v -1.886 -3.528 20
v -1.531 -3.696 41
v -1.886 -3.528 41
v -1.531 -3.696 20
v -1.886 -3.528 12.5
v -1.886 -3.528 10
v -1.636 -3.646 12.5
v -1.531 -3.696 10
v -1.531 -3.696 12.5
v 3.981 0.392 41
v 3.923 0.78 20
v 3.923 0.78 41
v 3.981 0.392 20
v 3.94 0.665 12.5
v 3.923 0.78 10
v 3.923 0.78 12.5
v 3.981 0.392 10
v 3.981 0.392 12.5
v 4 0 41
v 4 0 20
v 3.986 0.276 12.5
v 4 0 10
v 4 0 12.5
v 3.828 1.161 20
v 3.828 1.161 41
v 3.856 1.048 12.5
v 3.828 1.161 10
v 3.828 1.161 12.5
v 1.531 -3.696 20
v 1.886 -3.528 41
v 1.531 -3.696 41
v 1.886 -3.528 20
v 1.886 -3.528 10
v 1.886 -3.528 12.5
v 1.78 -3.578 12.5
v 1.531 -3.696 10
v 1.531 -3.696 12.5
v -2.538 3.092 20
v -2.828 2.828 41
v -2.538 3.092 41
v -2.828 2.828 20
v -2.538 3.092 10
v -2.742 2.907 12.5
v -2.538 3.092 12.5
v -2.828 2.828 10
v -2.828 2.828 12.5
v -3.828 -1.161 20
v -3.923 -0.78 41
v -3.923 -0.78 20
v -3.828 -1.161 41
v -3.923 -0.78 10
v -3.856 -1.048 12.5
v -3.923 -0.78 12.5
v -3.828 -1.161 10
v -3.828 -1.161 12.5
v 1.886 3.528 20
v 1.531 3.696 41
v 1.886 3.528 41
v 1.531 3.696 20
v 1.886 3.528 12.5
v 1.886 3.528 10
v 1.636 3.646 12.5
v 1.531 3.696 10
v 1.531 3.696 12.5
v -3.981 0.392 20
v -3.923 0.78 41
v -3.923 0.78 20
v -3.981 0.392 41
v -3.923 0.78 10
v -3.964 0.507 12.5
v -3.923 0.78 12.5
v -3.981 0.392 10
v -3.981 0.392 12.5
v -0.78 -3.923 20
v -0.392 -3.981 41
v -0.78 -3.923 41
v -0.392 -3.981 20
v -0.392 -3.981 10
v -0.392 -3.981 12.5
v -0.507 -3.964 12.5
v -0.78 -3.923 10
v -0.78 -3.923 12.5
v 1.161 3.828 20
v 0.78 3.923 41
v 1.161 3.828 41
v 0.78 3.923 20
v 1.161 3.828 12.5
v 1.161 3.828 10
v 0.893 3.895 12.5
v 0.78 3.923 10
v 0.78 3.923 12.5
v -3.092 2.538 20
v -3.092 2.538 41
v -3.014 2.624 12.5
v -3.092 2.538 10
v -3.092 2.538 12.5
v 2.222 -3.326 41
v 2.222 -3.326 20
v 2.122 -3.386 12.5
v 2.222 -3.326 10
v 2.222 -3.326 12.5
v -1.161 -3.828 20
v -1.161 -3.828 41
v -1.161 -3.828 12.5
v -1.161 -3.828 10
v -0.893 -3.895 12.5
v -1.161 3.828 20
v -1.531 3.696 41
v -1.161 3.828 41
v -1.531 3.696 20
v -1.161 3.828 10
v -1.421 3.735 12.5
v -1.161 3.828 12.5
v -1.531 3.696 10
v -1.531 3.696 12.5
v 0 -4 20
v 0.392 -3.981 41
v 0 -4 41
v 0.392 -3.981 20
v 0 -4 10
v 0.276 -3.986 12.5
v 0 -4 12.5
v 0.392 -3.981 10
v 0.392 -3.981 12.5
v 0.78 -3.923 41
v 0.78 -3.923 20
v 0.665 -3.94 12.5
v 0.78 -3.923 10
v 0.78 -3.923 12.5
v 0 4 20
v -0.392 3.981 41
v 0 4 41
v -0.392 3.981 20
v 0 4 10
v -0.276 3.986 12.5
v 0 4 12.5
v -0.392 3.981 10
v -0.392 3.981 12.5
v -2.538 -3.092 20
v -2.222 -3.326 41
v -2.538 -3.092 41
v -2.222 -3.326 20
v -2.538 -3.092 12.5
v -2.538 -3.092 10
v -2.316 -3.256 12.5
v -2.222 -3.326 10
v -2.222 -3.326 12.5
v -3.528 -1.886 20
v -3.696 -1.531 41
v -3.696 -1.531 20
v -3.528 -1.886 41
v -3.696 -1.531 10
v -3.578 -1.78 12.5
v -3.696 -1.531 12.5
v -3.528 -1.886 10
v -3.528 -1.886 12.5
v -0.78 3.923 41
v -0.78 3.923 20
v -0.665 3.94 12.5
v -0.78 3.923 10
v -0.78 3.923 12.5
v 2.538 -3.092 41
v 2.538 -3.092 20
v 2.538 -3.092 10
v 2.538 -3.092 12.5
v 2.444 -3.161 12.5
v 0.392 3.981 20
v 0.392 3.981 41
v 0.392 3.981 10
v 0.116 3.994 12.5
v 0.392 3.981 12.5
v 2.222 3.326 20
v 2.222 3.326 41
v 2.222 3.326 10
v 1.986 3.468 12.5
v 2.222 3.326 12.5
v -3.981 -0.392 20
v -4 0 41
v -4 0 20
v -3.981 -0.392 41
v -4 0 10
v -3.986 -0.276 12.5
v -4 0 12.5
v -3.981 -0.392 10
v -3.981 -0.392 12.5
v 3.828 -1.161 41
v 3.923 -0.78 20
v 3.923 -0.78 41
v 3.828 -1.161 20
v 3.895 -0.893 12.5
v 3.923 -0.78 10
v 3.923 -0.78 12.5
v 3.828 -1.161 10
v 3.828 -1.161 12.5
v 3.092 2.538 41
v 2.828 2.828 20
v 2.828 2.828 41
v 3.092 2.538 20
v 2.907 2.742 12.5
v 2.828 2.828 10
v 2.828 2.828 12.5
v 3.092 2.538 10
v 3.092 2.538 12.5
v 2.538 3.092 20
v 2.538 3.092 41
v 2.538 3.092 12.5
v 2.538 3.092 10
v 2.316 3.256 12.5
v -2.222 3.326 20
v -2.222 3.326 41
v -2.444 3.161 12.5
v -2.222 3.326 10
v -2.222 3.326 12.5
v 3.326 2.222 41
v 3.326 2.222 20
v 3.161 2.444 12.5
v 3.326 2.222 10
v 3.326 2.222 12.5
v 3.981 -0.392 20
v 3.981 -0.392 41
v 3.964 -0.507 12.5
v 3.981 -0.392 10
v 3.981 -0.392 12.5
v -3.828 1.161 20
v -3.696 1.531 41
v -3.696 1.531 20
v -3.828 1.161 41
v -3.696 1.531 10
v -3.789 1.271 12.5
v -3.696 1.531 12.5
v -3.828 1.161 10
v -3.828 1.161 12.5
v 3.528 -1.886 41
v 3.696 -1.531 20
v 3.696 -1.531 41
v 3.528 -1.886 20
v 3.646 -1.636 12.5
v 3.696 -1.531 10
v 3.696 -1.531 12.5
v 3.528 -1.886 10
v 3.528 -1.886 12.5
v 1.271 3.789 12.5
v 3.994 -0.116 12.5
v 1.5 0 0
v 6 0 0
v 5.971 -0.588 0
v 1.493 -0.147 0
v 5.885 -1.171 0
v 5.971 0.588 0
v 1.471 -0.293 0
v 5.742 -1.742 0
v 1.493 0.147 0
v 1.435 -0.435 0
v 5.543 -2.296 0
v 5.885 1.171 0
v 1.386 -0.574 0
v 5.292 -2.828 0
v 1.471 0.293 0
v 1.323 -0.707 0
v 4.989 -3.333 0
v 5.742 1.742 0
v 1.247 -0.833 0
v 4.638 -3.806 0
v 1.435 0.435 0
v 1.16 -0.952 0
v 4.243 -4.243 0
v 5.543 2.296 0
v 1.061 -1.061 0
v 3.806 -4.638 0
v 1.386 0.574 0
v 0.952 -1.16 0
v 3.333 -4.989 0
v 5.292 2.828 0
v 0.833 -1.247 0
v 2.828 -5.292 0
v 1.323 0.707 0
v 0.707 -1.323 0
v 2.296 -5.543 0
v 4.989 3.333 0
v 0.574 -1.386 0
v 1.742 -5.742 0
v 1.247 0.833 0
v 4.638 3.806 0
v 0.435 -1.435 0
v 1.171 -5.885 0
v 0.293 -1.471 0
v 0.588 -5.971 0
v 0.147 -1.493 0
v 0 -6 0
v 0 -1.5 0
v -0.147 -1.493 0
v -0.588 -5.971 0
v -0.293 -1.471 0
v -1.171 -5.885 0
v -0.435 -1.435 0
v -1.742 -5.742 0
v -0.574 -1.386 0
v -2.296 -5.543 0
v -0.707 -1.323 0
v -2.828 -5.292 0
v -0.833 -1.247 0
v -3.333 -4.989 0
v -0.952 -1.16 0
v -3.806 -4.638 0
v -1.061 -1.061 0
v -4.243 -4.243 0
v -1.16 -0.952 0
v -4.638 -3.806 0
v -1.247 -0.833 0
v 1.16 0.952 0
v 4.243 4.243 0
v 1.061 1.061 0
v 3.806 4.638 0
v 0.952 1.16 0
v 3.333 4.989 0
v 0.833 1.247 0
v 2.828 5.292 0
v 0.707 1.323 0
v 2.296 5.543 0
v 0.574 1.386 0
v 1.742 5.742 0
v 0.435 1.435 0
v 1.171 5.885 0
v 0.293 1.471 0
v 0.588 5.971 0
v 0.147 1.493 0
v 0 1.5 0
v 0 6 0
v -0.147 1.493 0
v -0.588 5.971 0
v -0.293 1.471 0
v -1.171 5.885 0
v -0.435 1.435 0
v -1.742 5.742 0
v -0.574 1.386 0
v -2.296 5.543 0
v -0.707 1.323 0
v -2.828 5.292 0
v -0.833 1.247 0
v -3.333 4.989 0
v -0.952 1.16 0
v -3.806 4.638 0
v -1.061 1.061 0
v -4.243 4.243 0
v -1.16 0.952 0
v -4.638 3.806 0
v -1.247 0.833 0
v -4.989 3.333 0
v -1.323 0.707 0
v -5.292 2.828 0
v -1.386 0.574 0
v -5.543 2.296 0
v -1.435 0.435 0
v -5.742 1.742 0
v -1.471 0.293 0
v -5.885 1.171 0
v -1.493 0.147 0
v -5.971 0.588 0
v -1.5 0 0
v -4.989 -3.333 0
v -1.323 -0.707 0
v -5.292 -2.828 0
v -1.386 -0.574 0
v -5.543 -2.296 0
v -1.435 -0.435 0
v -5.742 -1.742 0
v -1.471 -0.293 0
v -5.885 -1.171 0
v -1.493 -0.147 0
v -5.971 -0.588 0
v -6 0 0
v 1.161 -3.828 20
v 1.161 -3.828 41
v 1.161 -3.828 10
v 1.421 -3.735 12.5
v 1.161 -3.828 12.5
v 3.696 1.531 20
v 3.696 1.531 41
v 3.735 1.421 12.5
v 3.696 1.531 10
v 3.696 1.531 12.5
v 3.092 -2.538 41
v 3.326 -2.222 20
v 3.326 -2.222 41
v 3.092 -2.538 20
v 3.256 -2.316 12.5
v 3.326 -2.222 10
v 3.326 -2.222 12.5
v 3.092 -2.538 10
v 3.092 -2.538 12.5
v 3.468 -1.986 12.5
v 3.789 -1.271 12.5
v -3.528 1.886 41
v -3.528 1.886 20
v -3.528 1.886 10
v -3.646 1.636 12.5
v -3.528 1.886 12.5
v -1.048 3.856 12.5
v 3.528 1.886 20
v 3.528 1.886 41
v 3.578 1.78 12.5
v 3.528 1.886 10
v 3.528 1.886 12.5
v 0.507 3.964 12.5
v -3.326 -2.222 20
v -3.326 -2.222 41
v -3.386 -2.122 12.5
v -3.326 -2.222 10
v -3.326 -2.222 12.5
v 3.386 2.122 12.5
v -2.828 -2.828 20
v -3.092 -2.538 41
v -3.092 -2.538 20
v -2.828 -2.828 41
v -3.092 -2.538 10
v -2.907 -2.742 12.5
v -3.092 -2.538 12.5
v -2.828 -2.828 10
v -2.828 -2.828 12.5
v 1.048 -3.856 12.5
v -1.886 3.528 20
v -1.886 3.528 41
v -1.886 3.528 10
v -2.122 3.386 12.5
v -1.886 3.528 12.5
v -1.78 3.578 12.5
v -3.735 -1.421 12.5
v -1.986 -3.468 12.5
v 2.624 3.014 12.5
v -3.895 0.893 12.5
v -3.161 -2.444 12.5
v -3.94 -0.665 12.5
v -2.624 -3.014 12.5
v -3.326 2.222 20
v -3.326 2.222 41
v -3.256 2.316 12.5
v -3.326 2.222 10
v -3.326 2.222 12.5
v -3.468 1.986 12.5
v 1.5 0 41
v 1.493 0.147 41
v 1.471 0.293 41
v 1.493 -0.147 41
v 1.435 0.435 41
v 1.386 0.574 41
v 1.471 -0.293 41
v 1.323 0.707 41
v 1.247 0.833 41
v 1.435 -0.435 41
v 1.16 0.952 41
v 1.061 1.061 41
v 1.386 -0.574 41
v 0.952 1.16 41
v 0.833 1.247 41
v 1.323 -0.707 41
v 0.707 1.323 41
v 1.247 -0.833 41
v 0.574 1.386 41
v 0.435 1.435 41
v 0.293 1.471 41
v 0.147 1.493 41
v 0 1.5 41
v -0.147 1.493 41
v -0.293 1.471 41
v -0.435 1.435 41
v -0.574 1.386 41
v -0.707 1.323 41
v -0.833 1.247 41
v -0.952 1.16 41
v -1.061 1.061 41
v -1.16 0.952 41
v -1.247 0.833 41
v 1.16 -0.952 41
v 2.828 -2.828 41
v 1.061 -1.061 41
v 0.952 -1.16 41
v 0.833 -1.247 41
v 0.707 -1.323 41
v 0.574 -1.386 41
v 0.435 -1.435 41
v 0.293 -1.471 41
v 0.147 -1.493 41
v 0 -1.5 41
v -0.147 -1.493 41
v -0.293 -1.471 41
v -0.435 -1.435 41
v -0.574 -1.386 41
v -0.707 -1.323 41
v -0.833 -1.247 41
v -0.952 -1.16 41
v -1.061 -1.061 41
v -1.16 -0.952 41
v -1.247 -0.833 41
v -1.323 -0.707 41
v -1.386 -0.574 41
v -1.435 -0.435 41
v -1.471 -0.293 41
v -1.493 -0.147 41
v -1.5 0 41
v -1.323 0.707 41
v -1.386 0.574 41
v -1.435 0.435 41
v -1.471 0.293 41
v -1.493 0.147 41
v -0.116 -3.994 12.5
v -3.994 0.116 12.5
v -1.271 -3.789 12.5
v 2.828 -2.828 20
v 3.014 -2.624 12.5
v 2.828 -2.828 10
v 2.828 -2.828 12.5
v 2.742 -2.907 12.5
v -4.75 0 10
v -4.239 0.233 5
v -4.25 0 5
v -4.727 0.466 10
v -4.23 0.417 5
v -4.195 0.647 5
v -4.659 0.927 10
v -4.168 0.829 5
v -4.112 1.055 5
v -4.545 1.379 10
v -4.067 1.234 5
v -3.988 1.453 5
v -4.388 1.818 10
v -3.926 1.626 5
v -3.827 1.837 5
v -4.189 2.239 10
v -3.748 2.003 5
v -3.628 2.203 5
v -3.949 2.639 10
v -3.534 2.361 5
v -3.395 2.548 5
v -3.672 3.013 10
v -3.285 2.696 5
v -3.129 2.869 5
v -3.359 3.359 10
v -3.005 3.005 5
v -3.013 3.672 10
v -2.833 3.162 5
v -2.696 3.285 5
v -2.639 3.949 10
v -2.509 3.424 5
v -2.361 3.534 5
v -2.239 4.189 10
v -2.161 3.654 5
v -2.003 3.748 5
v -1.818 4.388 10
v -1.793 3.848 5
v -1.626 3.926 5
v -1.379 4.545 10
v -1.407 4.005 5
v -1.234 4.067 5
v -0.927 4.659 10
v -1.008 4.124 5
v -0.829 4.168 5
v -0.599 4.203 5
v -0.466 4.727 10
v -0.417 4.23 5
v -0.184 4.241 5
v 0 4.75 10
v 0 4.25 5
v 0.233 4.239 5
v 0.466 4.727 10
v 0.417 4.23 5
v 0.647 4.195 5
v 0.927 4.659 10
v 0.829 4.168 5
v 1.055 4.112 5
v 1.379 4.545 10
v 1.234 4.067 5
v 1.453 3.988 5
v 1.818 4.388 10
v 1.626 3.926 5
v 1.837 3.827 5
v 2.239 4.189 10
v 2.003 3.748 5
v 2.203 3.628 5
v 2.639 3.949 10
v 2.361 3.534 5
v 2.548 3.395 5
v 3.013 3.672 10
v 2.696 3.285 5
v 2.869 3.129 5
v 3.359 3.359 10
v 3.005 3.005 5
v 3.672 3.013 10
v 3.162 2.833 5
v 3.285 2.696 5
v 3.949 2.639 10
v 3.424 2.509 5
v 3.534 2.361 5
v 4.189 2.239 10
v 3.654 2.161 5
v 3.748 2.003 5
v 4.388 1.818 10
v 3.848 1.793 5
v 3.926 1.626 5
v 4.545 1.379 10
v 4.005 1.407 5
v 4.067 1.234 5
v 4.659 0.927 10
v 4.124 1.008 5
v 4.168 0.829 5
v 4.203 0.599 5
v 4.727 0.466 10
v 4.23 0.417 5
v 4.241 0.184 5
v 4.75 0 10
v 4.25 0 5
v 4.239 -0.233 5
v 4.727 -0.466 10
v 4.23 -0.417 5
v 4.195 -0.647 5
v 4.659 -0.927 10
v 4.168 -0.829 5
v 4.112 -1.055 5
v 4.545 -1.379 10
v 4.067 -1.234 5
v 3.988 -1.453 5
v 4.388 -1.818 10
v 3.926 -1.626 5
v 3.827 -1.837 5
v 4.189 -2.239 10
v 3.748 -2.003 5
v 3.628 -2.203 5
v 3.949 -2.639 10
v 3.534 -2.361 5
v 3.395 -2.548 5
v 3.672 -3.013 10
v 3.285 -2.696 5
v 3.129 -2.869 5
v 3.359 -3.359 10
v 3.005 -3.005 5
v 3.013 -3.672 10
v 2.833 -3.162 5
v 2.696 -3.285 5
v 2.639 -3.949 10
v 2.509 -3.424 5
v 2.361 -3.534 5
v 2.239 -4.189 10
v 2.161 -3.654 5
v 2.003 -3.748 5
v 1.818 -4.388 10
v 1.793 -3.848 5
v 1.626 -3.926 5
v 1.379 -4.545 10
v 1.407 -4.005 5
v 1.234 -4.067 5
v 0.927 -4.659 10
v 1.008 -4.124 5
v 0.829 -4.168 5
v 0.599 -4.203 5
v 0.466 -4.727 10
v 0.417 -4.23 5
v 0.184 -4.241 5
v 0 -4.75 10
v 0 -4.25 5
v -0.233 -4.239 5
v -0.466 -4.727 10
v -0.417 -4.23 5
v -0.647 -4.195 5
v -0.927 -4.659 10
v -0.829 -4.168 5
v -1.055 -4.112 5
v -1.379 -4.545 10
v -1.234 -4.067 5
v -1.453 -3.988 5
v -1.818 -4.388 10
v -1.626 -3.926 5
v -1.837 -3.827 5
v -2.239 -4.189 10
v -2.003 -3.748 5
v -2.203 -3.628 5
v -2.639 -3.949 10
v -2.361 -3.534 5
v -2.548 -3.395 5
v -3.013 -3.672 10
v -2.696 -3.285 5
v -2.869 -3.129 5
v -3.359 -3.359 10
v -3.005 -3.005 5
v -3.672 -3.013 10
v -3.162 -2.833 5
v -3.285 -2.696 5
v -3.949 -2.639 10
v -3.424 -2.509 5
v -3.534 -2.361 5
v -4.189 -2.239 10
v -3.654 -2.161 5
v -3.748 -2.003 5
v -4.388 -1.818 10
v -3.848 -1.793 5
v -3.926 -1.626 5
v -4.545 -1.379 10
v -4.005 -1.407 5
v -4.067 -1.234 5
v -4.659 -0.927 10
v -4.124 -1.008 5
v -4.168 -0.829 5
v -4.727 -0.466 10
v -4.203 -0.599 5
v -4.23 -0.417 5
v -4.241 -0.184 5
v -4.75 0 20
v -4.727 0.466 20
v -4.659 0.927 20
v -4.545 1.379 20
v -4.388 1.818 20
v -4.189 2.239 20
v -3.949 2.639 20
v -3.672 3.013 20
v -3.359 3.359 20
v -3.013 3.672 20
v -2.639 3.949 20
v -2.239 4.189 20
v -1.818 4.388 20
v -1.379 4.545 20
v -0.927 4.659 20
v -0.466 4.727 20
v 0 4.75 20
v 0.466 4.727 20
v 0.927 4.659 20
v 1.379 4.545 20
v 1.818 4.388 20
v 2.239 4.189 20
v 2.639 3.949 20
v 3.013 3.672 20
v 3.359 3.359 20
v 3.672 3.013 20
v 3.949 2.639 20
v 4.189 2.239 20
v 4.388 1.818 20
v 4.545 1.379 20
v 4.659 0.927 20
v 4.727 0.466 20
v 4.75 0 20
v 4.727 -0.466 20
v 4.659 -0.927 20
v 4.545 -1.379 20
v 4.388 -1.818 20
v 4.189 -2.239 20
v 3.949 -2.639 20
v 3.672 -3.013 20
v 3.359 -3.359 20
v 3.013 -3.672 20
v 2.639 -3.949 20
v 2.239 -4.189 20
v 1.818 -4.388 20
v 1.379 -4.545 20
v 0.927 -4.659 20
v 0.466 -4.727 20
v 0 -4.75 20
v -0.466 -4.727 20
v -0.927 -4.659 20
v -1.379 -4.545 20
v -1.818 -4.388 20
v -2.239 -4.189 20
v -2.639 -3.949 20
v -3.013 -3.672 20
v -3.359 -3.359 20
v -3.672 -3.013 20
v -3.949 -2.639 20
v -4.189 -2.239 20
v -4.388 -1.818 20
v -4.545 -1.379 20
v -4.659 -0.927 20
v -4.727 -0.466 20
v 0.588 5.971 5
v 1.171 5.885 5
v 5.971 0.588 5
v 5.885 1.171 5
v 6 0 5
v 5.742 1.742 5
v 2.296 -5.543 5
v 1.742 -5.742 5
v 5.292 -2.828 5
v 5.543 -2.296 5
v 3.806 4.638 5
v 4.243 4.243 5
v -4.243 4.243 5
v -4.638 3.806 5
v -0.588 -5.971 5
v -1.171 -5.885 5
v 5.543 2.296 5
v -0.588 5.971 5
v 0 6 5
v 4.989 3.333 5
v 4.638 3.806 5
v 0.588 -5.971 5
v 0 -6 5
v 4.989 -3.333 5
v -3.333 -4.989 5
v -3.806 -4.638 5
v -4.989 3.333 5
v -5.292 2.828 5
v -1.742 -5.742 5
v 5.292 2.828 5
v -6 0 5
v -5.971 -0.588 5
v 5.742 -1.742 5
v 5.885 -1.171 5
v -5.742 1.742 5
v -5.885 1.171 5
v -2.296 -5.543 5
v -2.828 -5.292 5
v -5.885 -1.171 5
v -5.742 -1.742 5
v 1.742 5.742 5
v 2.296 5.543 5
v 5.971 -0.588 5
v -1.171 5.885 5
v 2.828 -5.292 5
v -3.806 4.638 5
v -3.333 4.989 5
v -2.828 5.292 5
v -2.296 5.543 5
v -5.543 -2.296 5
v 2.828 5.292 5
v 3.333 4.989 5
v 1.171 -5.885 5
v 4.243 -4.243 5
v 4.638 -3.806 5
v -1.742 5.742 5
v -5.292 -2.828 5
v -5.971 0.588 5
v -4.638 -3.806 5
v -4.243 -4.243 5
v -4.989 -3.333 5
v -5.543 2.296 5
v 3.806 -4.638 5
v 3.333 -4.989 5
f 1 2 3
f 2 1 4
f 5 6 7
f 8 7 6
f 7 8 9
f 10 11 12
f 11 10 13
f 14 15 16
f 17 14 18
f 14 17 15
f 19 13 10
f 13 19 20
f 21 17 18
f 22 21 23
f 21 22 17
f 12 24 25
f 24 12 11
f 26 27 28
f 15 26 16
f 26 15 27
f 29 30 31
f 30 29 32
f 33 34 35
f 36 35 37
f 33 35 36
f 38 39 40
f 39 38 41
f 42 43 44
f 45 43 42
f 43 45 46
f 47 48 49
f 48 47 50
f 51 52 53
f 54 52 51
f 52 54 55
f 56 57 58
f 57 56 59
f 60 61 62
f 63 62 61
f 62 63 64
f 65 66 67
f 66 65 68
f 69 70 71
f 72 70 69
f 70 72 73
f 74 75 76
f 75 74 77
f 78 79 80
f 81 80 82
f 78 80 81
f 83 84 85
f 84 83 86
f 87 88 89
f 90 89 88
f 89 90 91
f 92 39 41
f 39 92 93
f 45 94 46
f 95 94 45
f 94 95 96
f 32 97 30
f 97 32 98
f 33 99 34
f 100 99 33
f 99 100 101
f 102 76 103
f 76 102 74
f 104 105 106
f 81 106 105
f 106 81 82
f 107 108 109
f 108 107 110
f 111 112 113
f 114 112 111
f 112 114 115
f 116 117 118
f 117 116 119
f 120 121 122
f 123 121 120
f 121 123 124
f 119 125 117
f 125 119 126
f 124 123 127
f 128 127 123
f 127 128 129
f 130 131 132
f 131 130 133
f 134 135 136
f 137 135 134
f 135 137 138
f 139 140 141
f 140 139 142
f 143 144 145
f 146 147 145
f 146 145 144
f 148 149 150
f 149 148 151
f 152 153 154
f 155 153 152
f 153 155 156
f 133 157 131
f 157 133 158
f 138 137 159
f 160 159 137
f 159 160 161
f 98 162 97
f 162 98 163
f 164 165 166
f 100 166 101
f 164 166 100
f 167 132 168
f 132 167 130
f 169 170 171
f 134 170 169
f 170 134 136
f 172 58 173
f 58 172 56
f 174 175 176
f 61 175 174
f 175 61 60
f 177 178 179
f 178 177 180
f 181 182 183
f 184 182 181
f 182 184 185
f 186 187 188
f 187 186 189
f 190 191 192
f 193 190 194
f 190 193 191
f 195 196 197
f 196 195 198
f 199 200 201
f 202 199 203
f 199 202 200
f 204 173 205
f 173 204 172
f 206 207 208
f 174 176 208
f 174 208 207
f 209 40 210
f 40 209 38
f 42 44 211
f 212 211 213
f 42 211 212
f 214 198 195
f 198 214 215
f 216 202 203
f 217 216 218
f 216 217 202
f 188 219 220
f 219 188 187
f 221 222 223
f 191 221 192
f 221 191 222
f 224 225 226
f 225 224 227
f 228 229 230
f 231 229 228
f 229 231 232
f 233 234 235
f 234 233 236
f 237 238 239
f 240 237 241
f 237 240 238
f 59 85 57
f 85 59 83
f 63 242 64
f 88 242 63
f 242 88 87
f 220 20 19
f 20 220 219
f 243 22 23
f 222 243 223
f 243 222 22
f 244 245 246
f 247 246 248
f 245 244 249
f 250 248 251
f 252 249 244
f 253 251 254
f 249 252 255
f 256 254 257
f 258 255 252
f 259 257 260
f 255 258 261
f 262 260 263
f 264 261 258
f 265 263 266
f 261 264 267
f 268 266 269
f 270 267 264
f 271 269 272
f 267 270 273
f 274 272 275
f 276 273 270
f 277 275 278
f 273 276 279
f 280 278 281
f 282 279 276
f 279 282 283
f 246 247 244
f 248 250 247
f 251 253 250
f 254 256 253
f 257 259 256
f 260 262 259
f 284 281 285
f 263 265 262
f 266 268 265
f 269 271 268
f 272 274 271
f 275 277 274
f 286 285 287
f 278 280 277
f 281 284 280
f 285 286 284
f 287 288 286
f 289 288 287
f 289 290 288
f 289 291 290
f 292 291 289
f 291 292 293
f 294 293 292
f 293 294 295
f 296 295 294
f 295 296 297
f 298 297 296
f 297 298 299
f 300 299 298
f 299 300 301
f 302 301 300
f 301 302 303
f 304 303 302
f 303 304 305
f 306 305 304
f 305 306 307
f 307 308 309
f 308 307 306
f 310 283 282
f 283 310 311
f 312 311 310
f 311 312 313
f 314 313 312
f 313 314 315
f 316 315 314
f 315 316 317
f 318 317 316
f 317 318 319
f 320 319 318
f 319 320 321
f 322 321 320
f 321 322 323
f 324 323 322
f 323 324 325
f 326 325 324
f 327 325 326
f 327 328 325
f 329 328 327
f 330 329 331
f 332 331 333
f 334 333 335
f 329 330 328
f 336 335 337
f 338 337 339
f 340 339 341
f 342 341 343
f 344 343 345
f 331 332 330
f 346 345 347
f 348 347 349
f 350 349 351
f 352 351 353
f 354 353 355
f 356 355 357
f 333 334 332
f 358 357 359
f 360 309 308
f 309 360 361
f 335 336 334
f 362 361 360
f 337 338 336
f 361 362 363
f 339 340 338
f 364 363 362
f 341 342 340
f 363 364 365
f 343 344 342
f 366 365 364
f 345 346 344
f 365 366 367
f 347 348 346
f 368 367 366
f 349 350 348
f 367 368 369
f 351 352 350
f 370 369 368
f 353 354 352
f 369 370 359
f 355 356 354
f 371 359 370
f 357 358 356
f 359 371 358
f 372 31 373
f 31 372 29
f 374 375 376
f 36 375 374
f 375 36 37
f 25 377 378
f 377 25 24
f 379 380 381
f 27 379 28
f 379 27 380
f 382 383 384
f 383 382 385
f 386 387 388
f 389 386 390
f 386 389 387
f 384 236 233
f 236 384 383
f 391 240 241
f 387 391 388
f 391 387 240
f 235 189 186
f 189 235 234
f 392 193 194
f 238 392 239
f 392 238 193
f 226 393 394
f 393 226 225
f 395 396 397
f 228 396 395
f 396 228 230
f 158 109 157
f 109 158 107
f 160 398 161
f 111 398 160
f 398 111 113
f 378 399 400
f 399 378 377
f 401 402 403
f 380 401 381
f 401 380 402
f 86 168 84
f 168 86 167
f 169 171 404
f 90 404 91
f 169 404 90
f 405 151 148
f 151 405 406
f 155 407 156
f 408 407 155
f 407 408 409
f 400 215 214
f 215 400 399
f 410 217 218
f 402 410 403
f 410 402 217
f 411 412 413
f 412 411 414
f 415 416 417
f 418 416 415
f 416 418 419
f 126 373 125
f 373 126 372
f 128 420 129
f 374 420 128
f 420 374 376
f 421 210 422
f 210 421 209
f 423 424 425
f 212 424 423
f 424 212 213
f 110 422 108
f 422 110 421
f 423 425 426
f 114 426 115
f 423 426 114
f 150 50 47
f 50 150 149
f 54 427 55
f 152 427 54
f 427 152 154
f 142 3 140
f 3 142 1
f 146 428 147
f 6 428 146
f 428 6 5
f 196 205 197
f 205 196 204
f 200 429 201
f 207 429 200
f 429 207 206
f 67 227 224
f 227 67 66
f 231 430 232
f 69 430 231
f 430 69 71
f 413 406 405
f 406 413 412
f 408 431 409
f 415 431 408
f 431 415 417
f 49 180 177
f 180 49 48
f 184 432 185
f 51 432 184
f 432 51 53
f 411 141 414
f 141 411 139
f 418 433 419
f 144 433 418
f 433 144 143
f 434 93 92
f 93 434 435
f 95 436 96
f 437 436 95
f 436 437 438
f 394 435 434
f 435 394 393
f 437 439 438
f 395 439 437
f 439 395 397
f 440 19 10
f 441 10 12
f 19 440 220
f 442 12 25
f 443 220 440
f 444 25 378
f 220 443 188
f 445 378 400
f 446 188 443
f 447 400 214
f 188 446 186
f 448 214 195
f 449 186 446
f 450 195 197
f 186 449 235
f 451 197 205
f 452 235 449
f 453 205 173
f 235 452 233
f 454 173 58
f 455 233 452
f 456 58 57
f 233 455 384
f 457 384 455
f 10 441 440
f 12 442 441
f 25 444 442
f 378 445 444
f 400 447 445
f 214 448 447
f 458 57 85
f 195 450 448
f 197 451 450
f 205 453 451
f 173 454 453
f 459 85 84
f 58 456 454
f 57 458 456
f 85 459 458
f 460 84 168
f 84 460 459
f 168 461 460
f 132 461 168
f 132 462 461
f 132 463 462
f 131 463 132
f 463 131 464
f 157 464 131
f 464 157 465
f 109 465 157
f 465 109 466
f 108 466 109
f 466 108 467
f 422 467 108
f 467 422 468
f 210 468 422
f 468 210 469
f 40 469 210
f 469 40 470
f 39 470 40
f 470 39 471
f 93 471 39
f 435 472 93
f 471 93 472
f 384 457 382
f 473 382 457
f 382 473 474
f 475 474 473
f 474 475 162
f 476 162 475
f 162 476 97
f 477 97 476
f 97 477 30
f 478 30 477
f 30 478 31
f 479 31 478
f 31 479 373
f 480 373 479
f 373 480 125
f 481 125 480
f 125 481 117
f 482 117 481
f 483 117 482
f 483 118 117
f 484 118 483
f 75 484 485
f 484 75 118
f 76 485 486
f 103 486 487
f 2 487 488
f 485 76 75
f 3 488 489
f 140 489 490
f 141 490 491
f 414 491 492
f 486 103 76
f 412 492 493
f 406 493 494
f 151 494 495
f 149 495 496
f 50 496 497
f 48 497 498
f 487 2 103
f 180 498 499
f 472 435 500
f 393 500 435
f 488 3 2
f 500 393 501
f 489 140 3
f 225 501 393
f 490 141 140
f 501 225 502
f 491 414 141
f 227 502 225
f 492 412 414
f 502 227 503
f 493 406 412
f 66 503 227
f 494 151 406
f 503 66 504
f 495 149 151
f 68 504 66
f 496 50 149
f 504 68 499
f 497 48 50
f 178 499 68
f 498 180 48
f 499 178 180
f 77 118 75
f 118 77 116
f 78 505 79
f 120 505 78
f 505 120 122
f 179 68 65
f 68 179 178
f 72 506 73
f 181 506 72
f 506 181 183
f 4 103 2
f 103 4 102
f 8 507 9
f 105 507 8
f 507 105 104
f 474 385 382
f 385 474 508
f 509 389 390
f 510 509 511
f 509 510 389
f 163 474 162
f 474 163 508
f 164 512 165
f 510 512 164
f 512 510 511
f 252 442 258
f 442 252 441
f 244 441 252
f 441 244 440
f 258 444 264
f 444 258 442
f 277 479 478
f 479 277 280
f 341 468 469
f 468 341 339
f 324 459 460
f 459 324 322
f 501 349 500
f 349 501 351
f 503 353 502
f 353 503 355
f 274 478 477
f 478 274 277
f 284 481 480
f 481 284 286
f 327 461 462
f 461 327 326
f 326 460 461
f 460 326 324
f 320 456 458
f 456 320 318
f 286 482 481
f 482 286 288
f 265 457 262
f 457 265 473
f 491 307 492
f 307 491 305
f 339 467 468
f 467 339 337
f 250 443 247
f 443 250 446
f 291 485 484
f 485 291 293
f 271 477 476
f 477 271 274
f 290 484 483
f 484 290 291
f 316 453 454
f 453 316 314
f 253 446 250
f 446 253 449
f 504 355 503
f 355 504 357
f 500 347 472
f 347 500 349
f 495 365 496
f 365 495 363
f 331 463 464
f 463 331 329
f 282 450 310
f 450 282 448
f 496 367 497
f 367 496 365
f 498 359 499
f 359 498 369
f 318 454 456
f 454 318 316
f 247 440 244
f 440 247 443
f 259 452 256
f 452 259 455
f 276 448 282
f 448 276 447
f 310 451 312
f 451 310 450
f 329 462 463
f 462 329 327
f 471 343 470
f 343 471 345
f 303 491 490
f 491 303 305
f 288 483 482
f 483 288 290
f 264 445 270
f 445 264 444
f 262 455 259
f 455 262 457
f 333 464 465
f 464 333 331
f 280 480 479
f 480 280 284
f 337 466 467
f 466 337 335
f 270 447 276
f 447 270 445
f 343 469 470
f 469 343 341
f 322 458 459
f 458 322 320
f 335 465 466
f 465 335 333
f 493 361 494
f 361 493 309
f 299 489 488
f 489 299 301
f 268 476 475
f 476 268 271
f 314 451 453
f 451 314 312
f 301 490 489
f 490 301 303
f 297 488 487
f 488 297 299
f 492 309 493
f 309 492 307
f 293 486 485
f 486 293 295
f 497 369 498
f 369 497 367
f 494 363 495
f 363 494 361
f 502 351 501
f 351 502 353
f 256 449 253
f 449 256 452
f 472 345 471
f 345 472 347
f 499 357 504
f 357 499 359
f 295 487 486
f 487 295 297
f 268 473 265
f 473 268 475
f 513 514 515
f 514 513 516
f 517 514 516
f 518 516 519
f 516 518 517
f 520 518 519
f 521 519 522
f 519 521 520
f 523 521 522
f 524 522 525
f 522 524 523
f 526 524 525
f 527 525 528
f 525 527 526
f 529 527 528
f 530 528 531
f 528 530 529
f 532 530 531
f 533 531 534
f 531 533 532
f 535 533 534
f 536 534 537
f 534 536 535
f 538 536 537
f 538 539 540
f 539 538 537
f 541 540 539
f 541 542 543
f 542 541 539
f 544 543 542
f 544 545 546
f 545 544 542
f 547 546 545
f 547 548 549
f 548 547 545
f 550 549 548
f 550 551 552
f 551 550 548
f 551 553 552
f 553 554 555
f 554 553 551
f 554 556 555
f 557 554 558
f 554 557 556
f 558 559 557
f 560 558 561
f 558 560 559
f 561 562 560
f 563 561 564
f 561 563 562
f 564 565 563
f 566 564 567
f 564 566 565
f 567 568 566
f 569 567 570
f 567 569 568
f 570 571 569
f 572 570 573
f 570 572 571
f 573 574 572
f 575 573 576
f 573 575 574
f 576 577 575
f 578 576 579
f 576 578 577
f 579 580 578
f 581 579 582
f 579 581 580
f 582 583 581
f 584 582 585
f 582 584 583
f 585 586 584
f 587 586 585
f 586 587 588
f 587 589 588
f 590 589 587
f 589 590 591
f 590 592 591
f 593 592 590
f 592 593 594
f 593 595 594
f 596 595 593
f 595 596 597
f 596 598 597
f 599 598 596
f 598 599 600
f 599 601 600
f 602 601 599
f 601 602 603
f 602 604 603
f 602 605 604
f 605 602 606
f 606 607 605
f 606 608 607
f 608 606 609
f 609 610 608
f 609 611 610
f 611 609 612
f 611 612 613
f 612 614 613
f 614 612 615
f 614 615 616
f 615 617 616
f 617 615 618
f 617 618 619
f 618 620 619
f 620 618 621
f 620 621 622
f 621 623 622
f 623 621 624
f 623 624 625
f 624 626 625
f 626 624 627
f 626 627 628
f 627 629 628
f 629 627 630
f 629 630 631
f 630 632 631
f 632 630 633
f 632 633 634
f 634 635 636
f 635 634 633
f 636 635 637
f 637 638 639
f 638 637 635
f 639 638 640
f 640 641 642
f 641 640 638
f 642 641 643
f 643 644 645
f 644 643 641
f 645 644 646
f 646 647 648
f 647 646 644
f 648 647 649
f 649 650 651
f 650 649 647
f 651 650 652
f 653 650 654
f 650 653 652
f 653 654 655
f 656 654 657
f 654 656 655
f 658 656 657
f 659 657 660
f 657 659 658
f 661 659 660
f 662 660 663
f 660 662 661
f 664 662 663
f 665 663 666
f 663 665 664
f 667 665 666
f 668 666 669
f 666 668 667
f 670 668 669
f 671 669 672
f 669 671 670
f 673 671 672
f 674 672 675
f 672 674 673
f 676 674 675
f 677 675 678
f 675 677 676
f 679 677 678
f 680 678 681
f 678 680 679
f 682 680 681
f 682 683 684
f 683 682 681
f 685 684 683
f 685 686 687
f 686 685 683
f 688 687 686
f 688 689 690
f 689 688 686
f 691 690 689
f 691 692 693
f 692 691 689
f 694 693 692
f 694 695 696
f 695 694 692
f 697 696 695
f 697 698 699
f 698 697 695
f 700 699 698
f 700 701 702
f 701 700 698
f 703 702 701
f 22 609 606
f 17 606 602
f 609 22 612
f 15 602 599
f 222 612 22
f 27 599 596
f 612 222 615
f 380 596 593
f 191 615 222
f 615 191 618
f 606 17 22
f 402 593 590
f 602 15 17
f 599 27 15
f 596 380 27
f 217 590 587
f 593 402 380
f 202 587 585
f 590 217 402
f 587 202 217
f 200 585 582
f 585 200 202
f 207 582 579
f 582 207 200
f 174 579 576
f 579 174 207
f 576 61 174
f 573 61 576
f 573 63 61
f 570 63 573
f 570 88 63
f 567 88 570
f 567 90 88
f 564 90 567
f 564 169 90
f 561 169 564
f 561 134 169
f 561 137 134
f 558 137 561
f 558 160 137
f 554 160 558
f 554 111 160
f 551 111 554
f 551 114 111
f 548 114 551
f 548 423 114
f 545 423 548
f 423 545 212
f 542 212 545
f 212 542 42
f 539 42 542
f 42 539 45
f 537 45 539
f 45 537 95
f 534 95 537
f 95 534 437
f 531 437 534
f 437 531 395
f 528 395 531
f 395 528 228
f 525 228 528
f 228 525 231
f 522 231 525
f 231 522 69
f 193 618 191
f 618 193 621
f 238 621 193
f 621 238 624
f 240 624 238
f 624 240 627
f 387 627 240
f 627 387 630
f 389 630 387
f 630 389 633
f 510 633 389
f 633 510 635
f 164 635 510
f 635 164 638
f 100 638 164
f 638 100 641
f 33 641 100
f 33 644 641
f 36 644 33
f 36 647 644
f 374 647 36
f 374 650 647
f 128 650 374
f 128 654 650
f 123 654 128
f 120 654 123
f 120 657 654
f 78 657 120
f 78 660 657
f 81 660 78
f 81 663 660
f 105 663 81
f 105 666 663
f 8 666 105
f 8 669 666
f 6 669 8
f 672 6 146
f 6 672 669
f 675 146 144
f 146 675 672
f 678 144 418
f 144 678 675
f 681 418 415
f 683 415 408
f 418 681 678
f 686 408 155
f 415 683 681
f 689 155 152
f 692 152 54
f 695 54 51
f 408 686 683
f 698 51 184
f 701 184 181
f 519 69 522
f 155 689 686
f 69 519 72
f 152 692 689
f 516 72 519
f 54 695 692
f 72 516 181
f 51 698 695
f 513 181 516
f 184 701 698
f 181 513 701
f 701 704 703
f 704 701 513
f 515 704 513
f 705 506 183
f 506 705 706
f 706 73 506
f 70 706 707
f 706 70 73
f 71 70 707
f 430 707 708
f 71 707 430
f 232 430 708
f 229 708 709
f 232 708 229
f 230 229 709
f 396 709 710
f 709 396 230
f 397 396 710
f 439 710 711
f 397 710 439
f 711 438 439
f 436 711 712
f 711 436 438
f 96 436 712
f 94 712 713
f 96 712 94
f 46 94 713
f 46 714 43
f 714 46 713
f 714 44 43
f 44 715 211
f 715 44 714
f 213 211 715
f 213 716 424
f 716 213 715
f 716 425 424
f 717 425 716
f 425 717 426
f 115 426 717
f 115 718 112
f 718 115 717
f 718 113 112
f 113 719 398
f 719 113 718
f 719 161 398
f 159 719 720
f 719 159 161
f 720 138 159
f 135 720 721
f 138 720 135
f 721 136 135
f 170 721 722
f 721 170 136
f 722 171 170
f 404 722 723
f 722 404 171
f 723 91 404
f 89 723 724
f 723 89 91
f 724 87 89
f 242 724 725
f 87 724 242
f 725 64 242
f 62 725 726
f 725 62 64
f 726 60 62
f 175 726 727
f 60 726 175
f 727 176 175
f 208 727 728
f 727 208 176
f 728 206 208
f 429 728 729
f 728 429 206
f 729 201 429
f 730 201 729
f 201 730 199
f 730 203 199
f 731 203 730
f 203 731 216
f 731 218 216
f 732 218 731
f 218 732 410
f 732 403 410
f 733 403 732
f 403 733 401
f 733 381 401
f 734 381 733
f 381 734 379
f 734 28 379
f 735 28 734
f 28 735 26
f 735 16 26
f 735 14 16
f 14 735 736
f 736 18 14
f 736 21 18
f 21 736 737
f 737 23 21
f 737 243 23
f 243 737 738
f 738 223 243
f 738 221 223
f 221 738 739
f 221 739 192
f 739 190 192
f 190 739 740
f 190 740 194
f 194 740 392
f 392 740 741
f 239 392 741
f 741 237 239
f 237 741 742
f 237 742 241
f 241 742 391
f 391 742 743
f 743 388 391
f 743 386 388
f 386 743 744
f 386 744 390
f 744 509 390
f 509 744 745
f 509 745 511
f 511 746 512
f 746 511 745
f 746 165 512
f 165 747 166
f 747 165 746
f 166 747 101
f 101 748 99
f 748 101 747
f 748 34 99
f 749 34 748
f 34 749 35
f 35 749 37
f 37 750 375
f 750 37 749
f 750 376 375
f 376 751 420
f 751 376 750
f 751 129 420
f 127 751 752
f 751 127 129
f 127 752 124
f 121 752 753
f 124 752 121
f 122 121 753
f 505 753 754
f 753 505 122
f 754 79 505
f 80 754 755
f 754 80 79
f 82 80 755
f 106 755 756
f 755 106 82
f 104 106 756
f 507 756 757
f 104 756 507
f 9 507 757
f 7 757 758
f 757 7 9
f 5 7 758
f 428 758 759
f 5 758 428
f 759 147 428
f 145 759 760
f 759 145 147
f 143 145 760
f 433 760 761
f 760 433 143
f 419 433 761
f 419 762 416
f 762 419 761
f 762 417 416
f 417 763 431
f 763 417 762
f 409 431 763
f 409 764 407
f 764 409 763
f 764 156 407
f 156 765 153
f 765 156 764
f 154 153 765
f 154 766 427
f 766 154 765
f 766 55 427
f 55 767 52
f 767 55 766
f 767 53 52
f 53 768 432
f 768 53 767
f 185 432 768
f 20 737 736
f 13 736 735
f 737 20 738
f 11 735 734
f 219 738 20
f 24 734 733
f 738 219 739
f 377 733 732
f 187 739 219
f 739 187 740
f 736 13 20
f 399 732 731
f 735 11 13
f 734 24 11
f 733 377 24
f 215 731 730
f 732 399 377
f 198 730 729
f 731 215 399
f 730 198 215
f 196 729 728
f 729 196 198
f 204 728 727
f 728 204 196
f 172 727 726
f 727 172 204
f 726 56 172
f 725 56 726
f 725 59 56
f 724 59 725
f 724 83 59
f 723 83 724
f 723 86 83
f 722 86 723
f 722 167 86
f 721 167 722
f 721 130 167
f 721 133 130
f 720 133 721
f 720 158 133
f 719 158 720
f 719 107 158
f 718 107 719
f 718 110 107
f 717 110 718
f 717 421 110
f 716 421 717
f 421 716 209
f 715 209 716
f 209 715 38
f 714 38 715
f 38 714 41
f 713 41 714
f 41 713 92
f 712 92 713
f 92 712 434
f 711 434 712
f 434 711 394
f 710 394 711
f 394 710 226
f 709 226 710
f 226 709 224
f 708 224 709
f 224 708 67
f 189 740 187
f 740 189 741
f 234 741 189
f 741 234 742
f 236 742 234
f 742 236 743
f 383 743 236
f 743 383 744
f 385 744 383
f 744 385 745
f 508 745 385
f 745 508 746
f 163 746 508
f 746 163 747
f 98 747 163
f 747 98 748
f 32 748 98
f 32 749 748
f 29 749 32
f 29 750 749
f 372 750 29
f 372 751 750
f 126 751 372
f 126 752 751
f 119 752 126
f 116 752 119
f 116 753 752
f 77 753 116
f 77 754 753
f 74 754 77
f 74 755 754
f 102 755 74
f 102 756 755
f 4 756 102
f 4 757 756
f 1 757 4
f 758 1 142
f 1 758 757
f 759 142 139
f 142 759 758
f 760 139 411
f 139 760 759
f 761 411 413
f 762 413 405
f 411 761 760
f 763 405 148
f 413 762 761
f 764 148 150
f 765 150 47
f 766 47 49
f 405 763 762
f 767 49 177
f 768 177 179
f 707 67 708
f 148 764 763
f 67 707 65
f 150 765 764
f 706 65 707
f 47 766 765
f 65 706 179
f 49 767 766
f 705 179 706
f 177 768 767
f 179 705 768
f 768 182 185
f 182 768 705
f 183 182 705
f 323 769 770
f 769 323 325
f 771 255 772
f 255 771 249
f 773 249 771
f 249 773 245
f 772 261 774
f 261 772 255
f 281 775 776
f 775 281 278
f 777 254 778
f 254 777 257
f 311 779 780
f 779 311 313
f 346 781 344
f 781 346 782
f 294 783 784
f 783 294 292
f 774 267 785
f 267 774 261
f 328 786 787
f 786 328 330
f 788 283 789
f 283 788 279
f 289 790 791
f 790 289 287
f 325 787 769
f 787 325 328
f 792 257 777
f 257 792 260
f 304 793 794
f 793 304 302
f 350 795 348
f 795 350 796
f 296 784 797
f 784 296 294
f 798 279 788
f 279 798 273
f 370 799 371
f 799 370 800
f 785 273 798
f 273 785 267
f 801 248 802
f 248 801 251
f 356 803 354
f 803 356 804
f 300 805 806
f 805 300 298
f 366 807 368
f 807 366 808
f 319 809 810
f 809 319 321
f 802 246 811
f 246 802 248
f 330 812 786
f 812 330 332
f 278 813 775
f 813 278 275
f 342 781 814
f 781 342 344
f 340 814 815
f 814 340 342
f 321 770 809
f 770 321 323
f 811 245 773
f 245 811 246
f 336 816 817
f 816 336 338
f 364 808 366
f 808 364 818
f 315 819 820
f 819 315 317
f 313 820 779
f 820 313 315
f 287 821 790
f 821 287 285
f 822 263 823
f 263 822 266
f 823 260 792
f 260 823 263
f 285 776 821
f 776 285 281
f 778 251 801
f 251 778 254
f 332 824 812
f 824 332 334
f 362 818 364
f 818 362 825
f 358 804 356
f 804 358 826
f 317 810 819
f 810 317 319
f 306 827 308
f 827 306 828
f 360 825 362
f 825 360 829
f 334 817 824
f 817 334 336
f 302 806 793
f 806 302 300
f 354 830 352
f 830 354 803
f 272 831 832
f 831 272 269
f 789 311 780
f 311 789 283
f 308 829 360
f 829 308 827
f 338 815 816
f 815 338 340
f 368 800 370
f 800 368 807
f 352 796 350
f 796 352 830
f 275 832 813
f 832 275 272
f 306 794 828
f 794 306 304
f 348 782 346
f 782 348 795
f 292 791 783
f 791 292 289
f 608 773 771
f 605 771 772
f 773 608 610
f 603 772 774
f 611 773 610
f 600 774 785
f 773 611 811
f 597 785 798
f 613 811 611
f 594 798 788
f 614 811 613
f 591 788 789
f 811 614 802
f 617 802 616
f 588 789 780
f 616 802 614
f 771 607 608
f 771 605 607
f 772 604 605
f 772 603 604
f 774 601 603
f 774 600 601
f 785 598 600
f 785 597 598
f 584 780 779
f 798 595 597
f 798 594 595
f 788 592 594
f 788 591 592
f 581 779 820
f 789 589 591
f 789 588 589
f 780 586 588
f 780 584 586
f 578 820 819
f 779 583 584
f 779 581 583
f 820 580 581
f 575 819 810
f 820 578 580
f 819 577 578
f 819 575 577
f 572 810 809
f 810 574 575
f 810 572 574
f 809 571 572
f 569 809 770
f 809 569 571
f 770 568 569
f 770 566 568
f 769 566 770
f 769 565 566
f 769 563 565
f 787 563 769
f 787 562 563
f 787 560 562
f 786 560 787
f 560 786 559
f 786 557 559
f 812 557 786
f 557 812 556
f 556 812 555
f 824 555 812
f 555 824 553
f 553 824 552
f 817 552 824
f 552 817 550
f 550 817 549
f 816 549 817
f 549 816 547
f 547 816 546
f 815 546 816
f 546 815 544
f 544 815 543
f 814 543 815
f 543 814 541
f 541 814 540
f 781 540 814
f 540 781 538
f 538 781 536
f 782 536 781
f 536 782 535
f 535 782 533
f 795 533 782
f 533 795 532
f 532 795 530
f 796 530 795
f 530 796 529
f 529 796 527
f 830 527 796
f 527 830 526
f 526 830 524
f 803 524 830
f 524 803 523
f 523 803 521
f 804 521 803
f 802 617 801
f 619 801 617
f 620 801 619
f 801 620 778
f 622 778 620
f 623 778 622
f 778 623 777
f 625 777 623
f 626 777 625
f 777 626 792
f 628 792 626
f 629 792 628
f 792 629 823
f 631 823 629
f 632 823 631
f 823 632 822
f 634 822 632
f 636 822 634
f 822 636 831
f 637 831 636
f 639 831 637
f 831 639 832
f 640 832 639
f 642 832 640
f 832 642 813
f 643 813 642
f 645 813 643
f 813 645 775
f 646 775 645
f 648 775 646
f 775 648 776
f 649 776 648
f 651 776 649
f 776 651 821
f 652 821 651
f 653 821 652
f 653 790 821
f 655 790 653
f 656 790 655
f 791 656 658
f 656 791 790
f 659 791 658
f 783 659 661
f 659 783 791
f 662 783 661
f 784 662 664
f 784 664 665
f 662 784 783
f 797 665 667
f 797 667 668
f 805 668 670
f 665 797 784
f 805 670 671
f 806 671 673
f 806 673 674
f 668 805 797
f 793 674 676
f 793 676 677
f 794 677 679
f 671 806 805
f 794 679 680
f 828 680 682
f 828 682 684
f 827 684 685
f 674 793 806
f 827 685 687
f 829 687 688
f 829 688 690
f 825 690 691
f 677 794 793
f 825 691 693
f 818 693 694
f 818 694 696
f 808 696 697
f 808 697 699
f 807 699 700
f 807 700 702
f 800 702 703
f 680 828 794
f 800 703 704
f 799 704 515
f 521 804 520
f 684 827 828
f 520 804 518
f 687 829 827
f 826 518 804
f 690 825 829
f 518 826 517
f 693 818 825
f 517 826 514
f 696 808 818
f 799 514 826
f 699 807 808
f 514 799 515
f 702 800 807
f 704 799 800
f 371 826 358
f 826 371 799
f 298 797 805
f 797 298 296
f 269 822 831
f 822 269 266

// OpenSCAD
// Dimensions for the hose-barb reducer
$fn = 64;

// Overall dimensions
hose_8mm_id = 8;        // Inner diameter of 8 mm tubing
hose_5mm_id = 5;      // Inner diameter of 5 mm tubing
bore_diameter = 3;       // 3 mm bore through the center
z0 = 0;                 // Start of 8 mm barb section
z1 = 20;                // End of 8 mm barb section
z2 = 25;                // End of collar section
z3 = 41;                // End of 5 mm barb section

// 8 mm barb section: 2 barbs, each 10 mm tall, stacked from z=0 to z=20
barb_8mm_height = 10;    // Height of each individual barb
barb_8mm_bottom_d = 7.5; // Outer diameter at bottom of 8 mm barb
barb_8mm_top_d = 9.5;  // Outer diameter at top of 8 mm barb
barb_8mm_step_back = 7.5; // Return to this diameter after the peak

// Collar section: 12 mm diameter, 5 mm long (z=20 to z=25)
collar_diameter = 12;

// 5 mm barb section: 2 barbs, each 8 mm tall, stacked from z=25 to z=41
barb_5mm_height = 8;     // Height of each individual barb
barb_5mm_bottom_d = 6.5; // Outer diameter at bottom of 5 mm barb
barb_5mm_top_d = 5.0;   // Outer diameter at top of 5 mm barb
barb_5mm_step_back = 6.5; // Return to this diameter after the peak

// Build the reducer using union of parts
module hose_reducer() {
    // Start with a solid cylinder for the bore
    difference() {
        // Full length cylinder from z=0 to z=41
        cylinder(h = z3, r = hose_8mm_id / 2, center = false);
        
        // Subtract the bore (a cylinder of 3 mm diameter through the full length)
        cylinder(h = z3 + 1, r = bore_diameter / 2, center = false, $fn = 64);
    }

    // Add 8 mm barbs: two stacked barbs from z=0 to z=20
    for (i = [0:1]) {
        z_start = z0 + i * barb_8mm_height;
        z_end = z_start + barb_8mm_height;

        // Create a sawtooth profile: expand from bottom to top, then step back
        // We'll use a rotate_extrude of a polygon that defines the radial profile
        // The profile is: (r_bottom, z_start) -> (r_top, z_end) -> (r_bottom, z_end) -> (r_bottom, z_start)
        // This forms a sawtooth shape in the r-z plane

        // Define the 2D polygon for one barb's outer profile
        // Points: [r, z]
        poly_points = [
            [barb_8mm_bottom_d / 2, z_start],
            [barb_8mm_top_d / 2, z_end],
            [barb_8mm_bottom_d / 2, z_end],
            [barb_8mm_bottom_d / 2, z_start]
        ];

        // Create a rotate_extrude of the polygon to form the barb
        // The polygon is in the r-z plane, so rotate_extrude will make it a 3D shape
        rotate_extrude(convexity = 10)
        polygon(poly_points);
    }

    // Add collar section: from z=20 to z=25, 12 mm diameter
    difference() {
        // Cylinder for the collar
        cylinder(h = z2 - z1, r = collar_diameter / 2, center = false);
        
        // Subtract the bore through this section
        cylinder(h = z2 - z1 + 1, r = bore_diameter / 2, center = false, $fn = 64);
    }

    // Add 5 mm barbs: two stacked barbs from z=25 to z=41
    for (i = [0:1]) {
        z_start = z2 + i * barb_5mm_height;
        z_end = z_start + barb_5mm_height;

        // Create a sawtooth profile: shrink from bottom to top, then step back
        // The profile: (r_bottom, z_start) -> (r_top, z_end) -> (r_bottom, z_end) -> (r_bottom, z_start)
        poly_points = [
            [barb_5mm_bottom_d / 2, z_start],
            [barb_5mm_top_d / 2, z_end],
            [barb_5mm_bottom_d / 2, z_end],
            [barb_5mm_bottom_d / 2, z_start]
        ];

        // Create a rotate_extrude of the polygon to form the barb
        rotate_extrude(convexity = 10)
        polygon(poly_points);
    }
}

// Call the module to build the part
hose_reducer();
